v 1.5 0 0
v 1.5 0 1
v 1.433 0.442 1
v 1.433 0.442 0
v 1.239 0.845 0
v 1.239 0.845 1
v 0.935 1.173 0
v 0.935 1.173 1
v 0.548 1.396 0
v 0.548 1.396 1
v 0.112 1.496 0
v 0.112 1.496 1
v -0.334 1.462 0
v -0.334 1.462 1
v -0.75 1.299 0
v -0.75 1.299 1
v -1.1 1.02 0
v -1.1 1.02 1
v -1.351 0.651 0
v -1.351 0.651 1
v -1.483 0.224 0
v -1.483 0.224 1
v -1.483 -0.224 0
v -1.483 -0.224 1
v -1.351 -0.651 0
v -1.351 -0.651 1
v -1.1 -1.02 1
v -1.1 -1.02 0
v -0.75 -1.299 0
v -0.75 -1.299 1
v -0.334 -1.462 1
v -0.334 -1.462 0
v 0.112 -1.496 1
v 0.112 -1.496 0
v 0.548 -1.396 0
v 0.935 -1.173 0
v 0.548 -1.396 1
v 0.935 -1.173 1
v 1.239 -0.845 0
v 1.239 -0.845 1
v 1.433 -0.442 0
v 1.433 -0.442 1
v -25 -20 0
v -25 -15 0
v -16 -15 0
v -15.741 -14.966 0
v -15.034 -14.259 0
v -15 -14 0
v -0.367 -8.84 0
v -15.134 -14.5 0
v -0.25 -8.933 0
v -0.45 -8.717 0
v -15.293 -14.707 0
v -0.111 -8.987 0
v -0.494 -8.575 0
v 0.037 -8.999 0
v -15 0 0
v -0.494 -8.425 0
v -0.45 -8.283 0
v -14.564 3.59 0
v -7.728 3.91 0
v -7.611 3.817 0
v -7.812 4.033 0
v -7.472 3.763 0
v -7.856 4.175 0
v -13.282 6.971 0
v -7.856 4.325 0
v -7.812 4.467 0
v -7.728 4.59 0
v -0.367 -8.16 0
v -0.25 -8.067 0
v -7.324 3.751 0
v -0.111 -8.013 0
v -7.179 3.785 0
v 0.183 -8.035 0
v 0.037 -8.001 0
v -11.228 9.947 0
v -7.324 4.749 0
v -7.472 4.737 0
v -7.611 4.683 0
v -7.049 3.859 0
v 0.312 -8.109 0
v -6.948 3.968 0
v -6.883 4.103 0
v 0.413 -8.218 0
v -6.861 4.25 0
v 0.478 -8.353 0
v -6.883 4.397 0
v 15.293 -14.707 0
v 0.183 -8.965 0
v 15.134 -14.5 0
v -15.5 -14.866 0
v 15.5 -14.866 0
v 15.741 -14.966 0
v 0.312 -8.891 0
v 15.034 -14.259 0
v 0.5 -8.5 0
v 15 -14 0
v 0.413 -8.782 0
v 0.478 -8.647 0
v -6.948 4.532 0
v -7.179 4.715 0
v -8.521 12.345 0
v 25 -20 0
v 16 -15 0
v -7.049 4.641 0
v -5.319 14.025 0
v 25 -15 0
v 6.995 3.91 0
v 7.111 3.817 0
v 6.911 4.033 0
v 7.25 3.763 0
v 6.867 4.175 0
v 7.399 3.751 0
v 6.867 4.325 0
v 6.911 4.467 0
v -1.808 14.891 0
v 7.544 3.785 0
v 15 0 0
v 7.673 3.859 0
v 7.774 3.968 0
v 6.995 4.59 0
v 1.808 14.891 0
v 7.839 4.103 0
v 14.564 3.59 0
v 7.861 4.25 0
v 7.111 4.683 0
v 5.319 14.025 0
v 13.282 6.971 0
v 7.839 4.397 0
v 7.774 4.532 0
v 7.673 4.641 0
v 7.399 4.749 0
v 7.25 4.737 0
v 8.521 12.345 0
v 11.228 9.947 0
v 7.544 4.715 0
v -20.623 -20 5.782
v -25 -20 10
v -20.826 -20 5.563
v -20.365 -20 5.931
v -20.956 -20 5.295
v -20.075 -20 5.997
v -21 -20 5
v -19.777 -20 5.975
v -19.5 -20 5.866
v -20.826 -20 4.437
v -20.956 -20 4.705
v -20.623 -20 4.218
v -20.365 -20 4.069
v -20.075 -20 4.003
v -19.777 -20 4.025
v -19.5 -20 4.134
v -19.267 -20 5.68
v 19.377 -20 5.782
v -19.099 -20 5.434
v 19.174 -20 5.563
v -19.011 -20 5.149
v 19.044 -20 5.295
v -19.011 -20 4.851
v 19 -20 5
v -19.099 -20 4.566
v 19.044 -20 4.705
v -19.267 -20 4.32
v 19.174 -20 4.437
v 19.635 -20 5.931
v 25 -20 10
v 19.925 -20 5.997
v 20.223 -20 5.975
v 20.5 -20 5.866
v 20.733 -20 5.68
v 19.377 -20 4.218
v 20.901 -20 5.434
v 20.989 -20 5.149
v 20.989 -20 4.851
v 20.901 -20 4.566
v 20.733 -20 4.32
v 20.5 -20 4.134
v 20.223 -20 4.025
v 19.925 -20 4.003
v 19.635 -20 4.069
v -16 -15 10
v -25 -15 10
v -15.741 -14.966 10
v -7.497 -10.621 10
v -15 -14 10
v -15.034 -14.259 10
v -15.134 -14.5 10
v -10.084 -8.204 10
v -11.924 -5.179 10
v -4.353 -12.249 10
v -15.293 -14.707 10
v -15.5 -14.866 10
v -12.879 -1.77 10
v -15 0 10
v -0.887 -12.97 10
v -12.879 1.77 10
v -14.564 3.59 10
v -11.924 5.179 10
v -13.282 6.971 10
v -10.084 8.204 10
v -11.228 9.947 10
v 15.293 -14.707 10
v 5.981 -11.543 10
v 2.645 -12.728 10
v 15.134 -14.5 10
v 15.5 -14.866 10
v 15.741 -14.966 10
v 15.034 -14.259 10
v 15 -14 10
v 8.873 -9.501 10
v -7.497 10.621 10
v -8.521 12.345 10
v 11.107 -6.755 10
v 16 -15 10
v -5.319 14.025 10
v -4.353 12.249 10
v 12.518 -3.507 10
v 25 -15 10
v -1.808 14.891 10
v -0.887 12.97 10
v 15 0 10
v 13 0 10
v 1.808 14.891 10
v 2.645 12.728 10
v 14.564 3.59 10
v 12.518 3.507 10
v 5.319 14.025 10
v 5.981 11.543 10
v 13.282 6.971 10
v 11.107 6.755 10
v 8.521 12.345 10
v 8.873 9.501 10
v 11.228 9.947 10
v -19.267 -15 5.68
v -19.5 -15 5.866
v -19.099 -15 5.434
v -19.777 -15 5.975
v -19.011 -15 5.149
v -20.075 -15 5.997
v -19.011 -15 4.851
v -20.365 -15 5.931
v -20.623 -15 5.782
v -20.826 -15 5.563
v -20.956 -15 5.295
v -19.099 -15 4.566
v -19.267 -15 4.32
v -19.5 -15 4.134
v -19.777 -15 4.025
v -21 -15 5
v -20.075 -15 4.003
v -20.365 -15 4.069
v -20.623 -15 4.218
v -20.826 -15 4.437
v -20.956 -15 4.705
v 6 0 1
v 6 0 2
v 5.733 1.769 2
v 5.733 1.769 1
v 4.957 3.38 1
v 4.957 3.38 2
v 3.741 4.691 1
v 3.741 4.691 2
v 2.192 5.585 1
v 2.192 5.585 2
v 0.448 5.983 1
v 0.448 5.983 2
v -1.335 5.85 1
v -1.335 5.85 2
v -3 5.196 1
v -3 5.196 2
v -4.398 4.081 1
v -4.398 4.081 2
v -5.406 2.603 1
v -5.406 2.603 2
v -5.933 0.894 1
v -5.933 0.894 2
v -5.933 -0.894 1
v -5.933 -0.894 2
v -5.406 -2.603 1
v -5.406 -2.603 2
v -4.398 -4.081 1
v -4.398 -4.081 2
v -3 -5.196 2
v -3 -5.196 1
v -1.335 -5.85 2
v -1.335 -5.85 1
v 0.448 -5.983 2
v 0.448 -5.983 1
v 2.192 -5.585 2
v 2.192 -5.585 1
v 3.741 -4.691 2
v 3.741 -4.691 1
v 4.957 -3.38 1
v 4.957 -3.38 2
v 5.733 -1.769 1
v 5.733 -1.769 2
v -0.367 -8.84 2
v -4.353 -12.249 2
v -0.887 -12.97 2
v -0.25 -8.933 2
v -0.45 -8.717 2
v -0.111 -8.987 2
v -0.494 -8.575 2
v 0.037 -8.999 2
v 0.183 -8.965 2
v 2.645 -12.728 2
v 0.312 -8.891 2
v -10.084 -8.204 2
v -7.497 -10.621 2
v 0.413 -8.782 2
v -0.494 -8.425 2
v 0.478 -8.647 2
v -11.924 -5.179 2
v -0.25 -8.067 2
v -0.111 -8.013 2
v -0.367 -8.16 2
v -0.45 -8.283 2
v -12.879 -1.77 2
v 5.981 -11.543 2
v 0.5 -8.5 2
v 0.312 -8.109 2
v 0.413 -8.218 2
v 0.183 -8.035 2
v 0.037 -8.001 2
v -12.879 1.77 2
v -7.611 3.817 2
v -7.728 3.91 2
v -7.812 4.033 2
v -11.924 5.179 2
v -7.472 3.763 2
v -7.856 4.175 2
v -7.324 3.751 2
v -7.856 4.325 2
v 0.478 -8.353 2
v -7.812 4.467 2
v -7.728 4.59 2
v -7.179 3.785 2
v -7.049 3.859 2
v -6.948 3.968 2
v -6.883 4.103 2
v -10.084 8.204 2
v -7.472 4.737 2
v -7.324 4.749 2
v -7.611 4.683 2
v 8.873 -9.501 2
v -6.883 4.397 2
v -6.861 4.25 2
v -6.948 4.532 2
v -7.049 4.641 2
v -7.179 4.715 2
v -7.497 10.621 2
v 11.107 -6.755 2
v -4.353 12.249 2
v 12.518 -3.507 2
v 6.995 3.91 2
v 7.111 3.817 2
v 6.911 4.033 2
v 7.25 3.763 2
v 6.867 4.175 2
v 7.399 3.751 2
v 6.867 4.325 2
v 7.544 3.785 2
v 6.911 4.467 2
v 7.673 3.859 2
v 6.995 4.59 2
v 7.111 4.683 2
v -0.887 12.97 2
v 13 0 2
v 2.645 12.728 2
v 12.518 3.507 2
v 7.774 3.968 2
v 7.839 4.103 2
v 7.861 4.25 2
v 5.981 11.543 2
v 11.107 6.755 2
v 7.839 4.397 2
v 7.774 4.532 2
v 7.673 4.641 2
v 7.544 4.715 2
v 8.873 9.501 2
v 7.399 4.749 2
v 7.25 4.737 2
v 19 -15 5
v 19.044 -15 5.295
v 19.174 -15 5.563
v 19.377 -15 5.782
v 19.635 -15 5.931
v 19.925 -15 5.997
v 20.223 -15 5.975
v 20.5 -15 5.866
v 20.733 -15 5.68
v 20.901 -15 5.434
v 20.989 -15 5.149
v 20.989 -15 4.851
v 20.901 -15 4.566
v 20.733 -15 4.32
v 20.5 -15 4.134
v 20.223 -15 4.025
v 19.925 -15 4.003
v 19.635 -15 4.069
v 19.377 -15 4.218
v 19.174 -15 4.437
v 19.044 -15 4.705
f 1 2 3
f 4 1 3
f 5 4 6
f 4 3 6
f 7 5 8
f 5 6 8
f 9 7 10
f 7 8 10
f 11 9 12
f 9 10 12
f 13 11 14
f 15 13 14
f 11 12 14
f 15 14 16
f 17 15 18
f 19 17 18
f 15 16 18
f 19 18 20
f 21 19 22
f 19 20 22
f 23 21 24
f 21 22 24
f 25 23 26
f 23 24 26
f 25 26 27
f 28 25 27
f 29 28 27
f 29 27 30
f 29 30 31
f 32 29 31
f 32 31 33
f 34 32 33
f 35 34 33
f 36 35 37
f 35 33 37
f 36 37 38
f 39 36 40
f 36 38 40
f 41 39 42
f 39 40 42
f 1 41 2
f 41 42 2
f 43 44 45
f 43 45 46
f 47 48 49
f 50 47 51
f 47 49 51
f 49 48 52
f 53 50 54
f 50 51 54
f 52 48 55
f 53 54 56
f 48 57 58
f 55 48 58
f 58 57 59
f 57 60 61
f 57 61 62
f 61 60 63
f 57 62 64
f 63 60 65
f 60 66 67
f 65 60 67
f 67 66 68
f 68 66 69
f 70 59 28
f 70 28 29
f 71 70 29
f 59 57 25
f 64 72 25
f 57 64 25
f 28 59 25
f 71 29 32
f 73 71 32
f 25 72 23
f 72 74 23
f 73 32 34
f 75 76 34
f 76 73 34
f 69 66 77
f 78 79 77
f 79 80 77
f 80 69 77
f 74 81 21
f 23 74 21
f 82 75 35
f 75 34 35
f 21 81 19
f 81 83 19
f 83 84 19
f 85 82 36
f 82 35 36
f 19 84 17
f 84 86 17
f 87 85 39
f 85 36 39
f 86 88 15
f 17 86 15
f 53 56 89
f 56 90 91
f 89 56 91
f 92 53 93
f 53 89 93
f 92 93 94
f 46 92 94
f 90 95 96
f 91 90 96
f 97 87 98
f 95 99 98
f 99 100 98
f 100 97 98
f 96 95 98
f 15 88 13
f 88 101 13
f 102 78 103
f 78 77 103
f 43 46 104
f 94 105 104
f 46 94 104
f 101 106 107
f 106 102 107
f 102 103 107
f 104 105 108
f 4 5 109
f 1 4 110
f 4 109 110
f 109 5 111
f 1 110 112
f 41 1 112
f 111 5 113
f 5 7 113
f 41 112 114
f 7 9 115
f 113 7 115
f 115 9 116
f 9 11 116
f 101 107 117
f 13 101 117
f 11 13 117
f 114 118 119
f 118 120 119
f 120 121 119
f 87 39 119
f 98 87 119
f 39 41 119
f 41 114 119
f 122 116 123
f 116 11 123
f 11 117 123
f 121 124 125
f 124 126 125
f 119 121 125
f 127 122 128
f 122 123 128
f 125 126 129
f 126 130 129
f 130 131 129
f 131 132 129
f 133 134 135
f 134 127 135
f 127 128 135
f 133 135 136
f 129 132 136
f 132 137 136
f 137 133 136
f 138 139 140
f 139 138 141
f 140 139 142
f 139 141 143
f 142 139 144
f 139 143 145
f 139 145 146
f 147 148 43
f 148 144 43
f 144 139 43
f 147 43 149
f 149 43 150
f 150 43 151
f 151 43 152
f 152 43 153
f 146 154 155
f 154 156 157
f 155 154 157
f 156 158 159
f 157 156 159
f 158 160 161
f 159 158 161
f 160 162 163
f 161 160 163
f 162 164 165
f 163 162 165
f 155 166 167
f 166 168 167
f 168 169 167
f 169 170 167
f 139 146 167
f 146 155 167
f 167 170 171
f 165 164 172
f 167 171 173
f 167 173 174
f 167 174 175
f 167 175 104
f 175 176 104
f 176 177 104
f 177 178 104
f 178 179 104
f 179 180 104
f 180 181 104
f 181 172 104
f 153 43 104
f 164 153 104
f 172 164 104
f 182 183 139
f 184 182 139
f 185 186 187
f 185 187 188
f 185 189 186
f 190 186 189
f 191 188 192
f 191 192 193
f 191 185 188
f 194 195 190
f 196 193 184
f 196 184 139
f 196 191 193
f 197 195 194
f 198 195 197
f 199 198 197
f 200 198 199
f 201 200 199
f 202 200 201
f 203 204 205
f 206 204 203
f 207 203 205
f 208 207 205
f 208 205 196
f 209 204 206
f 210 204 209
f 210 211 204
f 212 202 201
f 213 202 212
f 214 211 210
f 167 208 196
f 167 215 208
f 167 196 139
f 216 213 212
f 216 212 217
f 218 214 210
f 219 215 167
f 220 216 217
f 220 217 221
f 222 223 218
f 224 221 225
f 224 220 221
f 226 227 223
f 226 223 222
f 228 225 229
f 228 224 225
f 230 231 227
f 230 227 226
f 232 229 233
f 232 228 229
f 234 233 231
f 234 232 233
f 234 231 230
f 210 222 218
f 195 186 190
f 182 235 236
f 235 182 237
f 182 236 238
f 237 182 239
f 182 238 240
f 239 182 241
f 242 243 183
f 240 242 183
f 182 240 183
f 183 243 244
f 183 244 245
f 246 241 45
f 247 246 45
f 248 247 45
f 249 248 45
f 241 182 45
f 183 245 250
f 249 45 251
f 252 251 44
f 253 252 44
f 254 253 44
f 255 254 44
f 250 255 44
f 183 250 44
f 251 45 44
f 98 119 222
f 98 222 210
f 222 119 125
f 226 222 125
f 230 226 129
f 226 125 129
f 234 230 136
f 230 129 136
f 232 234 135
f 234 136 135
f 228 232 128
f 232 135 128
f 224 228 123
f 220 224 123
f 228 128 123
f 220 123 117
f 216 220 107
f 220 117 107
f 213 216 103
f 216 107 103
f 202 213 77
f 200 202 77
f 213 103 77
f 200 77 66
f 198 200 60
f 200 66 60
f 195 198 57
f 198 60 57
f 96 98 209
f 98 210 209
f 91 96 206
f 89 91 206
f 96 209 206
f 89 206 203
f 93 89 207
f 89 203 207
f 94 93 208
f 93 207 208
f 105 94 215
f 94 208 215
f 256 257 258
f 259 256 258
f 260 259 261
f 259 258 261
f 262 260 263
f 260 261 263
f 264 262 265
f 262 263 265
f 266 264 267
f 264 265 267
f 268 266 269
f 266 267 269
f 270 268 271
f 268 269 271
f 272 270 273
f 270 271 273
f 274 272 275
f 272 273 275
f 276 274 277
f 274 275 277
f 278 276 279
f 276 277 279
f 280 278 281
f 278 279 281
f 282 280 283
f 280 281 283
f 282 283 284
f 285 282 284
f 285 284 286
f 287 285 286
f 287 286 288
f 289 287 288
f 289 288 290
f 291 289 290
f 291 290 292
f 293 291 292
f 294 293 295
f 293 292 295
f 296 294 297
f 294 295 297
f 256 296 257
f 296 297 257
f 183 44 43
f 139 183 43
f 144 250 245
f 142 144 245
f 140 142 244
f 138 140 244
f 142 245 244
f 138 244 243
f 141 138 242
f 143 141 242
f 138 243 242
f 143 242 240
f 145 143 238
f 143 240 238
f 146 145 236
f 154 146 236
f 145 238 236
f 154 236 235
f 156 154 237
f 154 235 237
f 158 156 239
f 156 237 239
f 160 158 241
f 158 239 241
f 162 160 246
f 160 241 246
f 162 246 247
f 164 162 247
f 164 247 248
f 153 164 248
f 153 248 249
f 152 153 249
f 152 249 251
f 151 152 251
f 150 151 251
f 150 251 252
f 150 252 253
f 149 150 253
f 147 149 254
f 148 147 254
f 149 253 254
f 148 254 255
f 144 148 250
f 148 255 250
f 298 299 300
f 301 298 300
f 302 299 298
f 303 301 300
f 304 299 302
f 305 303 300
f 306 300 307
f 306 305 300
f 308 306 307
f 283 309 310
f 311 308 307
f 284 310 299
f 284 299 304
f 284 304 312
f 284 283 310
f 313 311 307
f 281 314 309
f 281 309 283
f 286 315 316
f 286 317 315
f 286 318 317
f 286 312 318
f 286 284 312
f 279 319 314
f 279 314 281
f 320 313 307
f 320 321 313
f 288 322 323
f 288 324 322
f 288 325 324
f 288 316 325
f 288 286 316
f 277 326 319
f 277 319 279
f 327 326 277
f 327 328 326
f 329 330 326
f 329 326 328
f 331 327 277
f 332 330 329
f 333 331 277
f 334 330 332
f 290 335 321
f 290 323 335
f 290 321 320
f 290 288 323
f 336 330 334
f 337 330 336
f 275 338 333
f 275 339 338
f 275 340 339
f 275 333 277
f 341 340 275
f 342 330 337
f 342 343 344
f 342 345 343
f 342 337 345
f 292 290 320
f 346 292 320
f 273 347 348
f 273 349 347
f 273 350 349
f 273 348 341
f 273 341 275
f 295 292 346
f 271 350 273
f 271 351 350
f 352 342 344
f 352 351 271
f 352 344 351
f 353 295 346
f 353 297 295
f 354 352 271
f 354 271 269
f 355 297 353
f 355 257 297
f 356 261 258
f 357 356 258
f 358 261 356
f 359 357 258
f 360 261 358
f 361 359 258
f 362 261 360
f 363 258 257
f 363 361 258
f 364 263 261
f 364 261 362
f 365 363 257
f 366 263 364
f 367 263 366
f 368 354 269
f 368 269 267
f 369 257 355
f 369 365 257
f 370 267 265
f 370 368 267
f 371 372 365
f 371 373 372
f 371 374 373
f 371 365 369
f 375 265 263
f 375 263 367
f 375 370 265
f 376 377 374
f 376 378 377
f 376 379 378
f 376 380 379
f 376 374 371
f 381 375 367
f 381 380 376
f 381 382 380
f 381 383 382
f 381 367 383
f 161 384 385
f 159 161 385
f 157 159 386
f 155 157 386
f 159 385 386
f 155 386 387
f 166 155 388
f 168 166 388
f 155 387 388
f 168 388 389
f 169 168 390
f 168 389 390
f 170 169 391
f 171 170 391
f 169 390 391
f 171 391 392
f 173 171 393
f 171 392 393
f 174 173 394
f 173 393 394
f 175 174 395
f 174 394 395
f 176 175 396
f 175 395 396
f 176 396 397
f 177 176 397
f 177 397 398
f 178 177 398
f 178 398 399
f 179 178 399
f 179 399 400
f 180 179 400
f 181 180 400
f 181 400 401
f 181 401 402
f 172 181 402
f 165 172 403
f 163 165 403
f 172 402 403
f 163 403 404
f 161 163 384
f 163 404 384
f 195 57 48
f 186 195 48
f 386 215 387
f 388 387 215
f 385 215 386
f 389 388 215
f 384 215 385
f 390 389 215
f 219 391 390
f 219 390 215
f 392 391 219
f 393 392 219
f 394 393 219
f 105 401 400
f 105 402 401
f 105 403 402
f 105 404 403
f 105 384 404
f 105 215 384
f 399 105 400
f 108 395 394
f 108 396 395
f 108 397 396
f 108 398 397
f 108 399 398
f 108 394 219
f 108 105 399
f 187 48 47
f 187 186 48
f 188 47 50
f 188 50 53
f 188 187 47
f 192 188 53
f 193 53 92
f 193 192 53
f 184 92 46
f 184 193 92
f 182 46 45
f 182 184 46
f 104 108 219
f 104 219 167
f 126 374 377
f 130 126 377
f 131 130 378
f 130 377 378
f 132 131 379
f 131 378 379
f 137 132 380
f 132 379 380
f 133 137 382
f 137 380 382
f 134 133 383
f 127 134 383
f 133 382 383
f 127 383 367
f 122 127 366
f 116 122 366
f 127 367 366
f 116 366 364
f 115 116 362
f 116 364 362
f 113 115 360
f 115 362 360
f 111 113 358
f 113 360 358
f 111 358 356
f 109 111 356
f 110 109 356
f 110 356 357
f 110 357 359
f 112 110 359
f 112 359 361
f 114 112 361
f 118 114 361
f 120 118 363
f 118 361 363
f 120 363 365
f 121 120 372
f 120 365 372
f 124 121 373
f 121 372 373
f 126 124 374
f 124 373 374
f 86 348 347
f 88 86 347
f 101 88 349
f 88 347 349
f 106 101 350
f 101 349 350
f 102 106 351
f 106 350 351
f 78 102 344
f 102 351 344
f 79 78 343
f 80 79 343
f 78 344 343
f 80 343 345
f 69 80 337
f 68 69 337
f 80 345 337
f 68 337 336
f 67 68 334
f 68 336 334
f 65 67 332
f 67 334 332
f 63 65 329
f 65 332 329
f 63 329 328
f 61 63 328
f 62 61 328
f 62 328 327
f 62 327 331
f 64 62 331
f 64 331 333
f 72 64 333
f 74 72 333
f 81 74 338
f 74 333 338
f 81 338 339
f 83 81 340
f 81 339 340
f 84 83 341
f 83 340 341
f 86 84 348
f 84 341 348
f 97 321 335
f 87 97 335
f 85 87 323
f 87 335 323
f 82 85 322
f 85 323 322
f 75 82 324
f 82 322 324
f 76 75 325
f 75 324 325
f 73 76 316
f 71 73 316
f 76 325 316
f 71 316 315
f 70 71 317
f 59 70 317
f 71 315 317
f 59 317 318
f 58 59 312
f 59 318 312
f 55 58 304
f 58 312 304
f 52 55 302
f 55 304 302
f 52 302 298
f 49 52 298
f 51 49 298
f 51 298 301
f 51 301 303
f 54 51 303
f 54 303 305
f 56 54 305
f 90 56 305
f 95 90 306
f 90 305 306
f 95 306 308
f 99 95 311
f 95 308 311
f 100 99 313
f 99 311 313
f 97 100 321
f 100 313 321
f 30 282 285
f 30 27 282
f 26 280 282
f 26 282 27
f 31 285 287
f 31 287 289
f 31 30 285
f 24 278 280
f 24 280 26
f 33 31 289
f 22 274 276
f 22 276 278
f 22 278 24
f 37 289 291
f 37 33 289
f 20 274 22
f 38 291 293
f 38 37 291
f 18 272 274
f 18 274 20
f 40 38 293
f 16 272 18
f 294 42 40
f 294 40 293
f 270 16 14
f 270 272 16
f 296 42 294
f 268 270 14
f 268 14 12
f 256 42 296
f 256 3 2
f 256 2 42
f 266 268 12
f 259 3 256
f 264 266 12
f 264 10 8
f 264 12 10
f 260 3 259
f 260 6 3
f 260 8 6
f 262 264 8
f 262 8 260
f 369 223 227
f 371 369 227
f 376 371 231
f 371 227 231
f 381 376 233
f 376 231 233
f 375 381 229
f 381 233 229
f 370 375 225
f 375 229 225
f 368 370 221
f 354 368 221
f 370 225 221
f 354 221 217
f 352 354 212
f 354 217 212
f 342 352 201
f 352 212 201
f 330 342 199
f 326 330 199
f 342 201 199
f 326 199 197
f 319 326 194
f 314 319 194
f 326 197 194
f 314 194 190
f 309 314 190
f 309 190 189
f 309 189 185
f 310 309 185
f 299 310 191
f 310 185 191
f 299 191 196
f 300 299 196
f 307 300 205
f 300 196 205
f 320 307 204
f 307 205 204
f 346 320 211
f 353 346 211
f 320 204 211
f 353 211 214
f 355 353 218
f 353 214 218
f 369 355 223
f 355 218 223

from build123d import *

# Parameters (mm, degrees)
PAD_DEPTH       = 10
SKETCH001_R     = 13
POCKET_DEPTH    = 8
SKETCH002_R     = 6
POCKET001_DEPTH = 1
SKETCH003_R     = 1.5
POCKET002_DEPTH = 1
SKETCH004_R     = 0.5
POCKET003_DEPTH = 2
SKETCH005_R     = 1
POCKET004_DEPTH = 5
FILLET_R        = 1
FILLET001_R     = 1


with BuildPart() as part:
    # Sketch → Pad (new body)
    with BuildSketch(Plane.XY):
        with BuildLine():
            ThreePointArc((15, 0), (0, 15), (-15, 0))
            Line((-15, 0), (-15, -15))
            Line((-15, -15), (-25, -15))
            Line((-25, -15), (-25, -20))
            Line((-25, -20), (25, -20))
            Line((25, -15), (25, -20))
            Line((15, -15), (25, -15))
            Line((15, 0), (15, -15))
        make_face()
    extrude(amount=PAD_DEPTH)

    # Sketch001 (on Face10 of Pad) → Pocket (cut)
    with BuildSketch(Plane.XY.offset(10)):
        Circle(SKETCH001_R)
    extrude(amount=-POCKET_DEPTH, mode=Mode.SUBTRACT)

    # Sketch002 (on Face12 of Pocket) → Pocket001 (cut)
    with BuildSketch(Plane.XY.offset(2)):
        Circle(SKETCH002_R)
    extrude(amount=-POCKET001_DEPTH, mode=Mode.SUBTRACT)

    # Sketch003 (on Face14 of Pocket001) → Pocket002 (cut)
    with BuildSketch(Plane.XY.offset(1)):
        Circle(SKETCH003_R)
    extrude(amount=-POCKET002_DEPTH, mode=Mode.SUBTRACT)

    # Sketch004 (on Face14 of Pocket002) → Pocket003 (cut)
    with BuildSketch(Plane.XY.offset(2)):
        with Locations((0, -8.5)):
            Circle(SKETCH004_R)
        with Locations((7.361216, 4.25)):
            Circle(SKETCH004_R)
        with Locations((-7.361216, 4.25)):
            Circle(SKETCH004_R)
    extrude(amount=-POCKET003_DEPTH, mode=Mode.SUBTRACT)

    # Sketch005 (on Face6 of Pocket003) → Pocket004 (cut)
    with BuildSketch(Plane(origin=(0, -15, 0), x_dir=(-1, 0, 0), z_dir=(0, 1, 0))):
        with Locations((-20, 5)):
            Circle(SKETCH005_R)
        with Locations((20, 5)):
            Circle(SKETCH005_R)
    extrude(amount=-POCKET004_DEPTH, mode=Mode.SUBTRACT)

    # Fillet
    fillet_edges = [part.edges().sort_by_distance(p)[0] for p in [
        (-15, -15, 5),
    ]]
    fillet(fillet_edges, radius=FILLET_R)

    # Fillet001
    fillet001_edges = [part.edges().sort_by_distance(p)[0] for p in [
        (15, -15, 5),
    ]]
    fillet(fillet001_edges, radius=FILLET001_R)


solid = part.part
